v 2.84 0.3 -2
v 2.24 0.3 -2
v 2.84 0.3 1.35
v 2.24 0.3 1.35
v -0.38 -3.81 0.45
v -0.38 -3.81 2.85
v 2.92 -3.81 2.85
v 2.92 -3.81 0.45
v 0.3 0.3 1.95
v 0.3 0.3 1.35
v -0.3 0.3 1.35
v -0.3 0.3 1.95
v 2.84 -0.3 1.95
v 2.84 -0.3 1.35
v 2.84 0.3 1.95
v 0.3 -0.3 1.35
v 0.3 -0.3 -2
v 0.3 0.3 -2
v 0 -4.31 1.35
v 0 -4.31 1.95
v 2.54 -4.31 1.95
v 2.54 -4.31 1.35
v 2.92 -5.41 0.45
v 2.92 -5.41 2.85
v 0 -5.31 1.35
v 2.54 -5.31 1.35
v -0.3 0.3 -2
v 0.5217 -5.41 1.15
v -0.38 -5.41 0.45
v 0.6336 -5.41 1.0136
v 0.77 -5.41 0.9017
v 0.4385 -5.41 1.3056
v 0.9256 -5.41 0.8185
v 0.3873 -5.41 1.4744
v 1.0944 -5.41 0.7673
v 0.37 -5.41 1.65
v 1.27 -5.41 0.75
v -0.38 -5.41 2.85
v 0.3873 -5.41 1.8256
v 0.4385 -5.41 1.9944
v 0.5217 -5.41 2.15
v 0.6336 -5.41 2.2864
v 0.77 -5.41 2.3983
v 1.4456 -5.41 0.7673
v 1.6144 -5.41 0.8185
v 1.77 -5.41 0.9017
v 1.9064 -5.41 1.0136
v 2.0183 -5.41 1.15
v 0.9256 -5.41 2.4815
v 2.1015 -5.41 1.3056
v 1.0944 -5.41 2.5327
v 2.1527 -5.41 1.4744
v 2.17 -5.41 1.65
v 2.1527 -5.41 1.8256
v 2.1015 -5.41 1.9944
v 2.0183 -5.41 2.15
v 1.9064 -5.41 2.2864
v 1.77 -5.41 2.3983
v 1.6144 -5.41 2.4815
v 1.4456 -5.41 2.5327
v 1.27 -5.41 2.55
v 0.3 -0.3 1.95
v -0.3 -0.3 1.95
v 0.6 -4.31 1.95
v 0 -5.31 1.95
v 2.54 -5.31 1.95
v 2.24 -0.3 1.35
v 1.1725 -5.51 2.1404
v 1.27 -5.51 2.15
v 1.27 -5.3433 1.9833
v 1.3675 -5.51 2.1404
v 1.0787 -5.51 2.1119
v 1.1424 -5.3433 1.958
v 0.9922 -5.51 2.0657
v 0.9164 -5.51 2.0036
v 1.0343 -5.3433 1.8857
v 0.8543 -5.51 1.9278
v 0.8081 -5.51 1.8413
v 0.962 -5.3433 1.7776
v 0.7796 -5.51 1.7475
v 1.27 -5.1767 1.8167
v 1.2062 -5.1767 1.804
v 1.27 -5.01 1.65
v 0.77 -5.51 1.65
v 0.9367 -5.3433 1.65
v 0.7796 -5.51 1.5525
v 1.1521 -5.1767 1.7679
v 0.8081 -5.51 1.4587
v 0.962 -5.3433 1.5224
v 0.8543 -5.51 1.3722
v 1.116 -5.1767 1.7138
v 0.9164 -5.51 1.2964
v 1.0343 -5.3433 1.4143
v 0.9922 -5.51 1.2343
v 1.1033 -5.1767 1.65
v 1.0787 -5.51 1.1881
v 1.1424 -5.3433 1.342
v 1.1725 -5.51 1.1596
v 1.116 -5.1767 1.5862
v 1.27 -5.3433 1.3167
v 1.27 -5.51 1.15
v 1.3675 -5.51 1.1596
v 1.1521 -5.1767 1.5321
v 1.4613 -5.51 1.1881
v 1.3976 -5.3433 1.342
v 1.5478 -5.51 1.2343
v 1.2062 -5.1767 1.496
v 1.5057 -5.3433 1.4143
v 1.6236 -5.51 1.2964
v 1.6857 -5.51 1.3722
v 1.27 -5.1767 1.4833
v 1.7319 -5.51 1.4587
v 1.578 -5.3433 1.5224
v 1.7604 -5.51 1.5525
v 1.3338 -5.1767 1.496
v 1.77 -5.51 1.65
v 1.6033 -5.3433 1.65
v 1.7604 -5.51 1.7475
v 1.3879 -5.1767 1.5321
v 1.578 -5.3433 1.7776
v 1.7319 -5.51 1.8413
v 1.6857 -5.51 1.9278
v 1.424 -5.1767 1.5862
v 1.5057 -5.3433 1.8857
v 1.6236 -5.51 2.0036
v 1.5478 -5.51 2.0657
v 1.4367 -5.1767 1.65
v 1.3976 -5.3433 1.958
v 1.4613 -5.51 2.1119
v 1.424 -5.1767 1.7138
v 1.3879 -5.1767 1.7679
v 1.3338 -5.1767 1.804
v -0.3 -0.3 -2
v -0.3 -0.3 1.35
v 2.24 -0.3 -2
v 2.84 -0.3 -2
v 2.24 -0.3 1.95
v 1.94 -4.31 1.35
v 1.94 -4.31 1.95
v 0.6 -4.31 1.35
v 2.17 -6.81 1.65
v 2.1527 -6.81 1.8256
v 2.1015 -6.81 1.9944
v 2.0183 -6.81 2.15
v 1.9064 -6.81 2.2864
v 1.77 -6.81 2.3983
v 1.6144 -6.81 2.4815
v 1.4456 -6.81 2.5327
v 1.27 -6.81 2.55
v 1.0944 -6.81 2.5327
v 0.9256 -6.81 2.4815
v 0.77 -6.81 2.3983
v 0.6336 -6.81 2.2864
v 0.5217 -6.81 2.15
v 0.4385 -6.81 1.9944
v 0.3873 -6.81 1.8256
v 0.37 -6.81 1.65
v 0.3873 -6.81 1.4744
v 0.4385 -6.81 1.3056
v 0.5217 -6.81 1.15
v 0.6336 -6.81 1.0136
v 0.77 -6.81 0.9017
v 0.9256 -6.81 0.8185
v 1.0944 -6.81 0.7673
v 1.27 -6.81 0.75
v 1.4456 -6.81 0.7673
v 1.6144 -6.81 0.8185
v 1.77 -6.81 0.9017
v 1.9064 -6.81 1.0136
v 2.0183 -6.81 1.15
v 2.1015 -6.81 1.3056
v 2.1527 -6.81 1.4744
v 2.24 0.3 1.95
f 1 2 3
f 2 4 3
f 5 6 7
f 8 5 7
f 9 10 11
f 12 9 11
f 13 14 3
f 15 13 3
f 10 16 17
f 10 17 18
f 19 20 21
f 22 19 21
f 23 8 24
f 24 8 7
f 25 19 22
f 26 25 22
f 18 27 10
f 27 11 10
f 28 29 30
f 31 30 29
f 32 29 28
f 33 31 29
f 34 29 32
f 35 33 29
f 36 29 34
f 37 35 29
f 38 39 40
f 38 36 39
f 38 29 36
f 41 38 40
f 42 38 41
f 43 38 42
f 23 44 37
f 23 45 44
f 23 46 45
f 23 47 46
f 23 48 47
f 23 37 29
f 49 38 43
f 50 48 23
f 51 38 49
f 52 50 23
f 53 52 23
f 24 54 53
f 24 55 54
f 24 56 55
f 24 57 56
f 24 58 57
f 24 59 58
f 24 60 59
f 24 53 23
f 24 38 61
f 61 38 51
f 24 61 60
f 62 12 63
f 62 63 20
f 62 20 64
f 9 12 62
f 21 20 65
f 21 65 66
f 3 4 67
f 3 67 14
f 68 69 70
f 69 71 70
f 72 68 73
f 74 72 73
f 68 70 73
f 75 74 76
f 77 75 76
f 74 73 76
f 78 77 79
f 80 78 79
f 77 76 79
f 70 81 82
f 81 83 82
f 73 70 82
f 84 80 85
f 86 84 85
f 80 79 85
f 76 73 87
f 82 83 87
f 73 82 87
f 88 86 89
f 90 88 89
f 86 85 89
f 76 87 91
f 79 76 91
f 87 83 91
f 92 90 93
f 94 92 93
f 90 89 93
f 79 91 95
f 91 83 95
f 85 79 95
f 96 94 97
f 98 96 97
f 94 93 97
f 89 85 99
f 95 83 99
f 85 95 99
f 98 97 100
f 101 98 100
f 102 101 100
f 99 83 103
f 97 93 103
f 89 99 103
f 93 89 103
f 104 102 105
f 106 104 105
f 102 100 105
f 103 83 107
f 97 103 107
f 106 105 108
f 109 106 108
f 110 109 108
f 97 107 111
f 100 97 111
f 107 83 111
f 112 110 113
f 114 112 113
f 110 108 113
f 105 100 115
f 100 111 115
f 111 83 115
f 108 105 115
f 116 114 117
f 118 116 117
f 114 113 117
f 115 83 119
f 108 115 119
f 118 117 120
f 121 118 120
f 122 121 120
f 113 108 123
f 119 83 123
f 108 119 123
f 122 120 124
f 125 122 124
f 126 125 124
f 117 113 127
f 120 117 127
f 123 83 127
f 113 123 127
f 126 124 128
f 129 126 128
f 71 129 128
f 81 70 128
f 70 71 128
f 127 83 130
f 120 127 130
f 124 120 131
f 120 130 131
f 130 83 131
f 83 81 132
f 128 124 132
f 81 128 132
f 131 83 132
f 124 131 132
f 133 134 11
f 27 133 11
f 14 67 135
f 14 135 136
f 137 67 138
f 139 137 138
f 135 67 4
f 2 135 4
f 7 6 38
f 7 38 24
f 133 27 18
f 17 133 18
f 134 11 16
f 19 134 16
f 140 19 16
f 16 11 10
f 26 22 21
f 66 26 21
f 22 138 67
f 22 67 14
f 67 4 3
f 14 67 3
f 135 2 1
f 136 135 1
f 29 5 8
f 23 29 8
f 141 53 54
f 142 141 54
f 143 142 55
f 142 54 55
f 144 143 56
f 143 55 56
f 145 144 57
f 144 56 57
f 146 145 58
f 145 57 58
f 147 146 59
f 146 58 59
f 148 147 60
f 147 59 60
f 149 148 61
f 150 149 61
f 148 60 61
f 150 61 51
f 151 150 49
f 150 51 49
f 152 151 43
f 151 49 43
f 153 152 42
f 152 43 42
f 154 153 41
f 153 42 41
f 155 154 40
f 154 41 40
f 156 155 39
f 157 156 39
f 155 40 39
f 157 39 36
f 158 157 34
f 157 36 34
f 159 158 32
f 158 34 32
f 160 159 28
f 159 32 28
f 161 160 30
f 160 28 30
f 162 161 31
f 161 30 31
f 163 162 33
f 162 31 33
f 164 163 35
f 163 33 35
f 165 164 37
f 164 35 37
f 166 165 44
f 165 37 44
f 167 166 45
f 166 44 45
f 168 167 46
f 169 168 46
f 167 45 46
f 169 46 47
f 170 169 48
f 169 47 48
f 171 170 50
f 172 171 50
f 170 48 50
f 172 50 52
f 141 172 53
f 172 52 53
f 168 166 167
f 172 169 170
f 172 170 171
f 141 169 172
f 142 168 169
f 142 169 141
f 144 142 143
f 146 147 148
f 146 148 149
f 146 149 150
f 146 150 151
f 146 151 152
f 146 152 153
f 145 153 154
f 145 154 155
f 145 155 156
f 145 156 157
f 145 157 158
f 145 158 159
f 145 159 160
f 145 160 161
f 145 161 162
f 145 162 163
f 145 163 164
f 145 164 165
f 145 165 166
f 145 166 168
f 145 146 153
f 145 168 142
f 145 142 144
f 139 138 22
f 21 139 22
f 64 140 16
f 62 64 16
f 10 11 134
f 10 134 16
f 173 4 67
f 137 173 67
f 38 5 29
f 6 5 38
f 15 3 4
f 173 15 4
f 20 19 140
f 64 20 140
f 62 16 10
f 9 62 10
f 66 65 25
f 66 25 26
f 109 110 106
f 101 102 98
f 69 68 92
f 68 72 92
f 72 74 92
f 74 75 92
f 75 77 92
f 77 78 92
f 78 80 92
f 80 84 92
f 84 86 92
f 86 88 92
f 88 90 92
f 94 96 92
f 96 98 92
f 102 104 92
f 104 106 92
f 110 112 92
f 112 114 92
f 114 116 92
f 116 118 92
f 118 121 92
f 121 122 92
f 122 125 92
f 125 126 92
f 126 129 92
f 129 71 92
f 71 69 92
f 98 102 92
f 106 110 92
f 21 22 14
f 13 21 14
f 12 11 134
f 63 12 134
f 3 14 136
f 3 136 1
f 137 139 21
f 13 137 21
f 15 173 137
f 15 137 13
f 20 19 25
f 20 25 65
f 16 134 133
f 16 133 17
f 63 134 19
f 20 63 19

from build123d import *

# Parameters (mm, degrees)
SKETCH_W       = 0.6
SKETCH_H       = 0.6
PAD_DEPTH      = 1.35
PAD_DEPTH_BACK = 2
PAD001_DEPTH   = 0.6
SKETCH002_W    = 2.54
SKETCH002_H    = 0.6
PAD002_DEPTH   = 1
SKETCH004_W    = 3.3
SKETCH004_H    = 2.4
PAD003_DEPTH   = 1.6
SKETCH006_R    = 0.9
PAD004_DEPTH   = 1.4


with BuildPart() as pad:
    # Sketch → Pad (new body, two sides)
    with BuildSketch(Plane.XY) as pad_sk:
        Rectangle(SKETCH_W, SKETCH_H)
        with Locations((2.54, 0)):
            Rectangle(SKETCH_W, SKETCH_H)
    extrude(amount=PAD_DEPTH)
    extrude(pad_sk.sketch, amount=-PAD_DEPTH_BACK)


with BuildPart() as pad001:
    # Sketch001 → Pad001 (new body)
    with BuildSketch(Plane.XY.offset(1.35)):
        Polygon((0.3, 0.3), (-0.3, 0.3), (-0.3, -0.3), (0, -4.31), (0.6, -4.31), (0.3, -0.3), align=None)
        Polygon((2.84, 0.3), (2.24, 0.3), (2.24, -0.3), (1.94, -4.31), (2.54, -4.31), (2.84, -0.3), align=None)
    extrude(amount=PAD001_DEPTH)


with BuildPart() as pad002:
    # Sketch002 → Pad002 (new body)
    with BuildSketch(Plane.XZ.offset(4.31)):
        with Locations((1.27, 1.65)):
            Rectangle(SKETCH002_W, SKETCH002_H)
    extrude(amount=PAD002_DEPTH)


with BuildPart() as revolution001:
    # Sketch005 → Revolution001 (revolve)
    with BuildSketch(Plane.YZ.offset(1.27)):
        Polygon((-5.01, 1.65), (-5.51, 1.65), (-5.51, 2.15), align=None)
    revolve(axis=Axis((1.27, -3.977201, 1.65), (0, -1, 0)))


with BuildPart() as pad004:
    # Sketch004 → Pad003 (new body)
    with BuildSketch(Plane.XZ.offset(3.81)):
        with Locations((1.27, 1.65)):
            Rectangle(SKETCH004_W, SKETCH004_H)
    extrude(amount=PAD003_DEPTH)

    # Sketch006 → Pad004 (new body)
    with BuildSketch(Plane.XZ.offset(5.41)):
        with Locations((1.27, 1.65)):
            Circle(SKETCH006_R)
    extrude(amount=PAD004_DEPTH)


solid = Compound([pad.part, pad001.part, pad002.part, revolution001.part, pad004.part])
